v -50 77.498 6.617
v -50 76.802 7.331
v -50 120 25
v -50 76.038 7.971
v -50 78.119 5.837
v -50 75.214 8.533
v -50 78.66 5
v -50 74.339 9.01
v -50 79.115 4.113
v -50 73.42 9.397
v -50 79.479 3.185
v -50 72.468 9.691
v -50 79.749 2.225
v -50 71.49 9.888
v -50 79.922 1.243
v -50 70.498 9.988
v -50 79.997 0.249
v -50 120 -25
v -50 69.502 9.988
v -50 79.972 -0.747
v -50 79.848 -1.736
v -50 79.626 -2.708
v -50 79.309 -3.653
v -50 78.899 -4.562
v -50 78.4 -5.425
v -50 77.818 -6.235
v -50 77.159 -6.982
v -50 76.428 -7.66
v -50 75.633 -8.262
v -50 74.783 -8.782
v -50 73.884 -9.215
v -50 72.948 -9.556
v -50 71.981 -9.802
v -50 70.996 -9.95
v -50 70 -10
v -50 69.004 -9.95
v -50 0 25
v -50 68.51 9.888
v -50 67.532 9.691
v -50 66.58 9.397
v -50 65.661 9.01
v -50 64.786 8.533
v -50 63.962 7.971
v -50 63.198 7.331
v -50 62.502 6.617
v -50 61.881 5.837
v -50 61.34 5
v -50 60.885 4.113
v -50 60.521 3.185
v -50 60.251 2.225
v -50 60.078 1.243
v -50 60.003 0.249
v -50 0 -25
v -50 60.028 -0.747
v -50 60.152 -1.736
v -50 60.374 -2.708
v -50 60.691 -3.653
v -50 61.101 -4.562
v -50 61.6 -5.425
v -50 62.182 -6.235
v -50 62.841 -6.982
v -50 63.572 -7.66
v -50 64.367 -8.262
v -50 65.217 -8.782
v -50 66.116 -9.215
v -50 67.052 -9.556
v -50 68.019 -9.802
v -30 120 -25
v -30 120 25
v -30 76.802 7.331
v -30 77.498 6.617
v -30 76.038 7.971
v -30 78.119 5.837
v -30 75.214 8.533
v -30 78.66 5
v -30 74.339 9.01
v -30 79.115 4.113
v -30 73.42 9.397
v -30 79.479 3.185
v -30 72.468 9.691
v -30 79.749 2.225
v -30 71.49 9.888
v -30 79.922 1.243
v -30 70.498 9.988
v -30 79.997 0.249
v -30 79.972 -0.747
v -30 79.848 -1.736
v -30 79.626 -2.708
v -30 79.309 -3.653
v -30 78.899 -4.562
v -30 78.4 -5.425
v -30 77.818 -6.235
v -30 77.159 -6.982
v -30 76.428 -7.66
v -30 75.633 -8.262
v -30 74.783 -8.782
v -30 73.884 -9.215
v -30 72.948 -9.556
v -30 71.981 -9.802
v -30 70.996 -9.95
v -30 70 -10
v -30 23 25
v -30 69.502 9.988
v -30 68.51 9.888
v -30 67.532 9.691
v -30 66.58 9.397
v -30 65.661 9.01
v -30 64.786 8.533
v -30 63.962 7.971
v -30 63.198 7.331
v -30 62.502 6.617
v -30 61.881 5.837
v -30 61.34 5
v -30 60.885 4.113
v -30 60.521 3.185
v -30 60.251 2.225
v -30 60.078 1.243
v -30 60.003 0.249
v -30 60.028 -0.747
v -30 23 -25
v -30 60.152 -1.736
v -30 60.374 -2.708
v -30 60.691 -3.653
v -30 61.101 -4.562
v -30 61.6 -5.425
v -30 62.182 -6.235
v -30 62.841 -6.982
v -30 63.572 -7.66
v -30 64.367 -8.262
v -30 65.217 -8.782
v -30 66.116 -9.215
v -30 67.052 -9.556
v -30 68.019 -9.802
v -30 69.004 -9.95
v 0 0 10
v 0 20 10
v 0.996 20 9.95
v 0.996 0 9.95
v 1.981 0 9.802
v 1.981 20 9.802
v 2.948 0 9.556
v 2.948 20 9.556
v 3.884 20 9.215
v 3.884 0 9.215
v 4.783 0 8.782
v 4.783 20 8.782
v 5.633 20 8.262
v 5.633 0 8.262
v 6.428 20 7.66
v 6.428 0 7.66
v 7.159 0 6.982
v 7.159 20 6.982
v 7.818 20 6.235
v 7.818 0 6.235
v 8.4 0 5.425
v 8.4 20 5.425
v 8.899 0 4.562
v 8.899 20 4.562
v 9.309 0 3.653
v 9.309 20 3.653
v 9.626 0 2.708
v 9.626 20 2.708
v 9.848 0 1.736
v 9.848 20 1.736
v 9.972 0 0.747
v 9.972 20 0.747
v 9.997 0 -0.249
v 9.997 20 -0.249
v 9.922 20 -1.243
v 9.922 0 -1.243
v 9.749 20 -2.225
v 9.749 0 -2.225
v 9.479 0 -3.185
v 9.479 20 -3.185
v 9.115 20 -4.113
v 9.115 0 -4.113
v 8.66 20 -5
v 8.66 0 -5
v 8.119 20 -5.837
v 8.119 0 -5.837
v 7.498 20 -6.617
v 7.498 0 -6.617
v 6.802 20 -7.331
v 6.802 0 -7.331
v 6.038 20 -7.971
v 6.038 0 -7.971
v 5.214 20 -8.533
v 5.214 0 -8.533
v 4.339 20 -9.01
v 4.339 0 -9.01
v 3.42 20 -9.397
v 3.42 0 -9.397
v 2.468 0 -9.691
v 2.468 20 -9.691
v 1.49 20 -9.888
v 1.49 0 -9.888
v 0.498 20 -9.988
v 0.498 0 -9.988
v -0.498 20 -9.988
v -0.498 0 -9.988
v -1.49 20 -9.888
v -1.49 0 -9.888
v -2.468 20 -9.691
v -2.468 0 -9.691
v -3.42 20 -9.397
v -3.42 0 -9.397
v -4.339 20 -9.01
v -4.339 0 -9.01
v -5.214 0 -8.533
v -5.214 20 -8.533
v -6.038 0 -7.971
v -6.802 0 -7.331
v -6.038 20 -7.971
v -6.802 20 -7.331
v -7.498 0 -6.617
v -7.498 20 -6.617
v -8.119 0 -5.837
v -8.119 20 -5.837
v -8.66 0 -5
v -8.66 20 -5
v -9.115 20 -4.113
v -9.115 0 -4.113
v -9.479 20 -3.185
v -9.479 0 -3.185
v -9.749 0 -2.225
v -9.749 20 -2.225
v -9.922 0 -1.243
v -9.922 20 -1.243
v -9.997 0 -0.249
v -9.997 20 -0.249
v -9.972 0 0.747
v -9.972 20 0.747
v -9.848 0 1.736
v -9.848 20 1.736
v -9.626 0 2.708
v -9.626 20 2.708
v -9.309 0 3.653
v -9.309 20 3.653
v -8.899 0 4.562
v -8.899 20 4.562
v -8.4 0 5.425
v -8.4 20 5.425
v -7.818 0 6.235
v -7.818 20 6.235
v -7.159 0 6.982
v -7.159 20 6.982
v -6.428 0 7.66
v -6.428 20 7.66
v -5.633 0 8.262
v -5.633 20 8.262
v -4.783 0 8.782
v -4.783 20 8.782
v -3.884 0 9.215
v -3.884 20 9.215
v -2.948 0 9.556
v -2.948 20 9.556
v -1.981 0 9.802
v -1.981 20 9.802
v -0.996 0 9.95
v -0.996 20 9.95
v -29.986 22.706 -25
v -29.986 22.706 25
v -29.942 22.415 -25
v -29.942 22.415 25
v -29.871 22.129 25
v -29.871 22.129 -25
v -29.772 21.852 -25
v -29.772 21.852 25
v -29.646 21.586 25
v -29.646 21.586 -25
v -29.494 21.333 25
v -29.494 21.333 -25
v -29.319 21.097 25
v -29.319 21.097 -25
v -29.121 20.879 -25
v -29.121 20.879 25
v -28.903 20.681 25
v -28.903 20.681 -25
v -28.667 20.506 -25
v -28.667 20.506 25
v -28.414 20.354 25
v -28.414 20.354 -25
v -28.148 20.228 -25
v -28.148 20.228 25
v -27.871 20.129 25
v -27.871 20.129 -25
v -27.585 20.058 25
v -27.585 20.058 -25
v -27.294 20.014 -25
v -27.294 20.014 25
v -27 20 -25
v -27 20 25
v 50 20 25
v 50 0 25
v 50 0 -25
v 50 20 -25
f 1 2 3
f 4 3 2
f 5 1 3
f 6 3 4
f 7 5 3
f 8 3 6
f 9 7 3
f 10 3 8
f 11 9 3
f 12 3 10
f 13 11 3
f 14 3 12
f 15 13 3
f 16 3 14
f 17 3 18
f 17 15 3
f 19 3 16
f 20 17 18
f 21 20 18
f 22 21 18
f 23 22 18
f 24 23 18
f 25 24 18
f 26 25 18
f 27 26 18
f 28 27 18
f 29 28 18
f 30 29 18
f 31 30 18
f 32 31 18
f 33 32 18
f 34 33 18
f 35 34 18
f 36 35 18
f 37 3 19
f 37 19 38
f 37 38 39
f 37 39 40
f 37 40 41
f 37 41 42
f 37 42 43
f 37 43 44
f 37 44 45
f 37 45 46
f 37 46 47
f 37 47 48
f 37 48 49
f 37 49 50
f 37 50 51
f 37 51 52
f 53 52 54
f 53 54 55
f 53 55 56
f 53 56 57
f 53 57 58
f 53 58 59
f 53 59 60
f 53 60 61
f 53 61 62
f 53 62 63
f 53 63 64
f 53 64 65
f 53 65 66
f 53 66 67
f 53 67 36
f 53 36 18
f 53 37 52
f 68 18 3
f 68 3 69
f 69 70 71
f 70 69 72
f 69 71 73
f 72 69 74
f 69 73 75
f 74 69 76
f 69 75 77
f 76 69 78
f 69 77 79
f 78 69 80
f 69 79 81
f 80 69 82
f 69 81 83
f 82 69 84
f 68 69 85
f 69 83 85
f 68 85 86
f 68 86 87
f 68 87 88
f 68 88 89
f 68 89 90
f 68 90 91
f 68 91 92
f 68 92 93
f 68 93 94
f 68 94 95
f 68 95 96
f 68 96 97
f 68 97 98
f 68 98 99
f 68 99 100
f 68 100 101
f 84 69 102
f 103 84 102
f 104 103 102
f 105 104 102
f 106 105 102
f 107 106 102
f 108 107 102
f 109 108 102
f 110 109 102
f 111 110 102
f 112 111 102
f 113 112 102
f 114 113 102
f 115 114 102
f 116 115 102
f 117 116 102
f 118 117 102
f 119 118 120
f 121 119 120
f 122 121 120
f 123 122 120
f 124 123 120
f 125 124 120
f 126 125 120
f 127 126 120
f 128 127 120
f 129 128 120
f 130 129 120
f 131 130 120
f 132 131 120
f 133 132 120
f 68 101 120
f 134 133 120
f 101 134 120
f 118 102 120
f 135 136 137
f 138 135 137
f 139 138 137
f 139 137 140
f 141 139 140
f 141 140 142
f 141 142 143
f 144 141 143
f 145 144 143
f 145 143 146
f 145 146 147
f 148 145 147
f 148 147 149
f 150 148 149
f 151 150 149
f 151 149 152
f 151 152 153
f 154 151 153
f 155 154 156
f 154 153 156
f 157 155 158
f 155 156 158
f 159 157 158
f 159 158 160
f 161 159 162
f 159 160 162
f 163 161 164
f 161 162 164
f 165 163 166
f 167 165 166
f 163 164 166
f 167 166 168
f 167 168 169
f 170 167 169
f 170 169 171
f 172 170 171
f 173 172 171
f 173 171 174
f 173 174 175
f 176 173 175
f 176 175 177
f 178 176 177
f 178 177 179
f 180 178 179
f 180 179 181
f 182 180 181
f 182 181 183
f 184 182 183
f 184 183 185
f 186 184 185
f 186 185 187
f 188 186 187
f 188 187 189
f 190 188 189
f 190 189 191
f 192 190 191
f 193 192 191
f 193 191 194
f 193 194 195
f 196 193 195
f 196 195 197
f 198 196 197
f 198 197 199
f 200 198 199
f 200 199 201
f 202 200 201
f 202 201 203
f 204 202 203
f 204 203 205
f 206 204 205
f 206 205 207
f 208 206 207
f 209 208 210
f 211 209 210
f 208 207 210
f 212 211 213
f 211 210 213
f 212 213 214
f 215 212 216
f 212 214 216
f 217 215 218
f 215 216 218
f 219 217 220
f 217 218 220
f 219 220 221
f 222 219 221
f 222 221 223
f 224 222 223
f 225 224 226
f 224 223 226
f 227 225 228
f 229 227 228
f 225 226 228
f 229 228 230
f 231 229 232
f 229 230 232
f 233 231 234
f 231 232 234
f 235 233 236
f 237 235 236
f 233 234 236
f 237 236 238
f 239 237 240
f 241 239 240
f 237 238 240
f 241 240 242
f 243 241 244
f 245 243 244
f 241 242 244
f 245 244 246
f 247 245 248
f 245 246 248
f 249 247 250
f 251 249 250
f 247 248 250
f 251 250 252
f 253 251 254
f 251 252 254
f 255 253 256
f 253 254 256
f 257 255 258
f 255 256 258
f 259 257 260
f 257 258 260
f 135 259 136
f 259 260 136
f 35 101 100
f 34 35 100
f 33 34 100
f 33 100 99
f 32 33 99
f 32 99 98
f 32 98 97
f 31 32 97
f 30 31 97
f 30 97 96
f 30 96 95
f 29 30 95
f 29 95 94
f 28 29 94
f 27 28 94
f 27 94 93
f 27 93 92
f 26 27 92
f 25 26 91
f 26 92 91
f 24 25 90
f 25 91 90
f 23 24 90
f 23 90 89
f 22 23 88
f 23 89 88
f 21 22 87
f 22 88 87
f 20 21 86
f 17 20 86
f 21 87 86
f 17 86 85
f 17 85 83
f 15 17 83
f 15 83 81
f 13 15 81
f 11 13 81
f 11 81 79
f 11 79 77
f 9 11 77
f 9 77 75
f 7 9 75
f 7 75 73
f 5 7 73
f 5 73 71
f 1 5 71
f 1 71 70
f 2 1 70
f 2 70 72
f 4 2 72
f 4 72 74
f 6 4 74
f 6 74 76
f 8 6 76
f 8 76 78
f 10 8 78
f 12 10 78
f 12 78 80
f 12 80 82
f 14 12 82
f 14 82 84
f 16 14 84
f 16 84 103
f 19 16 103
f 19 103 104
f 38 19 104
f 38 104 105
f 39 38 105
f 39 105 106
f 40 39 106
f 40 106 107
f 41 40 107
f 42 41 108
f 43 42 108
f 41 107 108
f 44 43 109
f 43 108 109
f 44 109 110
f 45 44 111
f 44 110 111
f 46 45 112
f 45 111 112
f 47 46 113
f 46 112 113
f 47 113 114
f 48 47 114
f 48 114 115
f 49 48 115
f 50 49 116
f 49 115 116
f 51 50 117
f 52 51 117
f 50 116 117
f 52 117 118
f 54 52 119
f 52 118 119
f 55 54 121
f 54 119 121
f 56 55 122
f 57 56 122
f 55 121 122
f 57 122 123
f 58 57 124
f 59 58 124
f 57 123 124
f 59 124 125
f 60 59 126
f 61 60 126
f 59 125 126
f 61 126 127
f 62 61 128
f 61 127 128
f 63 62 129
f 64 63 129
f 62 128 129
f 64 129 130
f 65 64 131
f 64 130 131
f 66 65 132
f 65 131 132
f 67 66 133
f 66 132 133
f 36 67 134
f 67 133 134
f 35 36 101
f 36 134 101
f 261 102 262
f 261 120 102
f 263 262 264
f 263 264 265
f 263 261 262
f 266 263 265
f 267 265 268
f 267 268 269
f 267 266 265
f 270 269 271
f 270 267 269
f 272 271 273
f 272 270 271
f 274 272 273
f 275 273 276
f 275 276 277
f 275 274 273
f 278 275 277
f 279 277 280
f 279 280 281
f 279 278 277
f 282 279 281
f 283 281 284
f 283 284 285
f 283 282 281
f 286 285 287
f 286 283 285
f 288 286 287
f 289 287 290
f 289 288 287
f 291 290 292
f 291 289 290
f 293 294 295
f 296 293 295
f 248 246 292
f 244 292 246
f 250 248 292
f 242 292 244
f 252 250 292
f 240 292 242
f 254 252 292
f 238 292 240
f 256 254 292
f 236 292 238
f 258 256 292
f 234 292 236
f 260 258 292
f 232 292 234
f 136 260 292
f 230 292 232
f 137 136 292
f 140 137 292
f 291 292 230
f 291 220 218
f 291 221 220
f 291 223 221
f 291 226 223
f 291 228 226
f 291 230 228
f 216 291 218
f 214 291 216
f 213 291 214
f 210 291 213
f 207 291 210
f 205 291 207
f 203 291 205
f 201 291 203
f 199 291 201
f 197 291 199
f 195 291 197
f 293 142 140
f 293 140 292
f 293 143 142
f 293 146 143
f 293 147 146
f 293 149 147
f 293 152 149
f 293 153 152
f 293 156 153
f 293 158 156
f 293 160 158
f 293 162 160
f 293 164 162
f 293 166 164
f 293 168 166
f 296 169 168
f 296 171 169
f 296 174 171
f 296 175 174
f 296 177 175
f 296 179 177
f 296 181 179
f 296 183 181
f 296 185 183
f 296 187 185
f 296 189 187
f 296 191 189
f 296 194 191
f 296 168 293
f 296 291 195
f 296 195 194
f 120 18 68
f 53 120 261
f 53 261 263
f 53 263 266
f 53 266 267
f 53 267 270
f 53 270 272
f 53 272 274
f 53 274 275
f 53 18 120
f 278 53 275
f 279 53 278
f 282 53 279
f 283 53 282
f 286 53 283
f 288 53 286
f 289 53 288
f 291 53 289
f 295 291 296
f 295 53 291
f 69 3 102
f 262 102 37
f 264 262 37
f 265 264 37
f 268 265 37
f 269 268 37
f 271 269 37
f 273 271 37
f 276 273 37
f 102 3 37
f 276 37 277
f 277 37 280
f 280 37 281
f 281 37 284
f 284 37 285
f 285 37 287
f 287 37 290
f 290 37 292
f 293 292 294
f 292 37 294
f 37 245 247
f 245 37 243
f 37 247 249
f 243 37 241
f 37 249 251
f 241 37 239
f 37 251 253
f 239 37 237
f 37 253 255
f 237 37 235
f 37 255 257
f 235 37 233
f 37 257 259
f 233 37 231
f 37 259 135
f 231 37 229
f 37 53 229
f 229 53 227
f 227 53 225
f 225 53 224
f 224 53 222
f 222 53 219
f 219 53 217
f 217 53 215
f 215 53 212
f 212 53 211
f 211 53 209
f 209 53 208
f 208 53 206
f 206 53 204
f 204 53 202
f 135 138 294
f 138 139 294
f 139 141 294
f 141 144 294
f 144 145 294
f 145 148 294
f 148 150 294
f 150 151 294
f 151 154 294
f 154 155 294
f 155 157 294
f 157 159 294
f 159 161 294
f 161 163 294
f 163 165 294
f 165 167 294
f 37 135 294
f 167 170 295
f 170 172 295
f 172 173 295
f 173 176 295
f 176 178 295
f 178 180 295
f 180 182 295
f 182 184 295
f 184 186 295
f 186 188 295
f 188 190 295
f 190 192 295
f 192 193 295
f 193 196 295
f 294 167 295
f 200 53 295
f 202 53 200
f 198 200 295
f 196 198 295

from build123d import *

# Parameters (mm, degrees)
SKETCH1_W           = 100
SKETCH1_H           = 50
BOSS_EXTRUDE1_DEPTH = 20
SKETCH3_W           = 20
SKETCH3_H           = 50
BOSS_EXTRUDE2_DEPTH = 100
SKETCH4_R           = 10
CUT_EXTRUDE1_DEPTH  = 100
SKETCH5_R           = 10
CUT_EXTRUDE2_DEPTH  = 100
FILLET1_R           = 3


with BuildPart() as part:
    # Sketch1 → Boss-Extrude1 (new body)
    with BuildSketch(Plane(origin=(0, 0, 0), x_dir=(1, 0, 0), z_dir=(0, 1, 0))):
        Rectangle(SKETCH1_W, SKETCH1_H)
    extrude(amount=BOSS_EXTRUDE1_DEPTH)

    # Sketch3 → Boss-Extrude2 (add)
    with BuildSketch(Plane(origin=(0, 20, 0), x_dir=(1, 0, 0), z_dir=(0, 1, 0))):
        with Locations((-40, 0)):
            Rectangle(SKETCH3_W, SKETCH3_H)
    extrude(amount=BOSS_EXTRUDE2_DEPTH)

    # Sketch4 → Cut-Extrude1 (cut)
    with BuildSketch(Plane(origin=(-30, 0, 0), x_dir=(0, 0, -1), z_dir=(1, 0, 0))):
        with Locations((0, 70)):
            Circle(SKETCH4_R)
    extrude(amount=-CUT_EXTRUDE1_DEPTH, mode=Mode.SUBTRACT)

    # Sketch5 → Cut-Extrude2 (cut)
    with BuildSketch(Plane(origin=(0, 20, 0), x_dir=(1, 0, 0), z_dir=(0, 1, 0))):
        with Locations(Location((0, 0, 0), (0, 0, 270))):
            Circle(SKETCH5_R)
    extrude(amount=-CUT_EXTRUDE2_DEPTH, mode=Mode.SUBTRACT)

    # Fillet1
    fillet1_edges = [part.edges().sort_by_distance(p)[0] for p in [
        (-30, 20, 0),
    ]]
    fillet(fillet1_edges, radius=FILLET1_R)


solid = part.part
